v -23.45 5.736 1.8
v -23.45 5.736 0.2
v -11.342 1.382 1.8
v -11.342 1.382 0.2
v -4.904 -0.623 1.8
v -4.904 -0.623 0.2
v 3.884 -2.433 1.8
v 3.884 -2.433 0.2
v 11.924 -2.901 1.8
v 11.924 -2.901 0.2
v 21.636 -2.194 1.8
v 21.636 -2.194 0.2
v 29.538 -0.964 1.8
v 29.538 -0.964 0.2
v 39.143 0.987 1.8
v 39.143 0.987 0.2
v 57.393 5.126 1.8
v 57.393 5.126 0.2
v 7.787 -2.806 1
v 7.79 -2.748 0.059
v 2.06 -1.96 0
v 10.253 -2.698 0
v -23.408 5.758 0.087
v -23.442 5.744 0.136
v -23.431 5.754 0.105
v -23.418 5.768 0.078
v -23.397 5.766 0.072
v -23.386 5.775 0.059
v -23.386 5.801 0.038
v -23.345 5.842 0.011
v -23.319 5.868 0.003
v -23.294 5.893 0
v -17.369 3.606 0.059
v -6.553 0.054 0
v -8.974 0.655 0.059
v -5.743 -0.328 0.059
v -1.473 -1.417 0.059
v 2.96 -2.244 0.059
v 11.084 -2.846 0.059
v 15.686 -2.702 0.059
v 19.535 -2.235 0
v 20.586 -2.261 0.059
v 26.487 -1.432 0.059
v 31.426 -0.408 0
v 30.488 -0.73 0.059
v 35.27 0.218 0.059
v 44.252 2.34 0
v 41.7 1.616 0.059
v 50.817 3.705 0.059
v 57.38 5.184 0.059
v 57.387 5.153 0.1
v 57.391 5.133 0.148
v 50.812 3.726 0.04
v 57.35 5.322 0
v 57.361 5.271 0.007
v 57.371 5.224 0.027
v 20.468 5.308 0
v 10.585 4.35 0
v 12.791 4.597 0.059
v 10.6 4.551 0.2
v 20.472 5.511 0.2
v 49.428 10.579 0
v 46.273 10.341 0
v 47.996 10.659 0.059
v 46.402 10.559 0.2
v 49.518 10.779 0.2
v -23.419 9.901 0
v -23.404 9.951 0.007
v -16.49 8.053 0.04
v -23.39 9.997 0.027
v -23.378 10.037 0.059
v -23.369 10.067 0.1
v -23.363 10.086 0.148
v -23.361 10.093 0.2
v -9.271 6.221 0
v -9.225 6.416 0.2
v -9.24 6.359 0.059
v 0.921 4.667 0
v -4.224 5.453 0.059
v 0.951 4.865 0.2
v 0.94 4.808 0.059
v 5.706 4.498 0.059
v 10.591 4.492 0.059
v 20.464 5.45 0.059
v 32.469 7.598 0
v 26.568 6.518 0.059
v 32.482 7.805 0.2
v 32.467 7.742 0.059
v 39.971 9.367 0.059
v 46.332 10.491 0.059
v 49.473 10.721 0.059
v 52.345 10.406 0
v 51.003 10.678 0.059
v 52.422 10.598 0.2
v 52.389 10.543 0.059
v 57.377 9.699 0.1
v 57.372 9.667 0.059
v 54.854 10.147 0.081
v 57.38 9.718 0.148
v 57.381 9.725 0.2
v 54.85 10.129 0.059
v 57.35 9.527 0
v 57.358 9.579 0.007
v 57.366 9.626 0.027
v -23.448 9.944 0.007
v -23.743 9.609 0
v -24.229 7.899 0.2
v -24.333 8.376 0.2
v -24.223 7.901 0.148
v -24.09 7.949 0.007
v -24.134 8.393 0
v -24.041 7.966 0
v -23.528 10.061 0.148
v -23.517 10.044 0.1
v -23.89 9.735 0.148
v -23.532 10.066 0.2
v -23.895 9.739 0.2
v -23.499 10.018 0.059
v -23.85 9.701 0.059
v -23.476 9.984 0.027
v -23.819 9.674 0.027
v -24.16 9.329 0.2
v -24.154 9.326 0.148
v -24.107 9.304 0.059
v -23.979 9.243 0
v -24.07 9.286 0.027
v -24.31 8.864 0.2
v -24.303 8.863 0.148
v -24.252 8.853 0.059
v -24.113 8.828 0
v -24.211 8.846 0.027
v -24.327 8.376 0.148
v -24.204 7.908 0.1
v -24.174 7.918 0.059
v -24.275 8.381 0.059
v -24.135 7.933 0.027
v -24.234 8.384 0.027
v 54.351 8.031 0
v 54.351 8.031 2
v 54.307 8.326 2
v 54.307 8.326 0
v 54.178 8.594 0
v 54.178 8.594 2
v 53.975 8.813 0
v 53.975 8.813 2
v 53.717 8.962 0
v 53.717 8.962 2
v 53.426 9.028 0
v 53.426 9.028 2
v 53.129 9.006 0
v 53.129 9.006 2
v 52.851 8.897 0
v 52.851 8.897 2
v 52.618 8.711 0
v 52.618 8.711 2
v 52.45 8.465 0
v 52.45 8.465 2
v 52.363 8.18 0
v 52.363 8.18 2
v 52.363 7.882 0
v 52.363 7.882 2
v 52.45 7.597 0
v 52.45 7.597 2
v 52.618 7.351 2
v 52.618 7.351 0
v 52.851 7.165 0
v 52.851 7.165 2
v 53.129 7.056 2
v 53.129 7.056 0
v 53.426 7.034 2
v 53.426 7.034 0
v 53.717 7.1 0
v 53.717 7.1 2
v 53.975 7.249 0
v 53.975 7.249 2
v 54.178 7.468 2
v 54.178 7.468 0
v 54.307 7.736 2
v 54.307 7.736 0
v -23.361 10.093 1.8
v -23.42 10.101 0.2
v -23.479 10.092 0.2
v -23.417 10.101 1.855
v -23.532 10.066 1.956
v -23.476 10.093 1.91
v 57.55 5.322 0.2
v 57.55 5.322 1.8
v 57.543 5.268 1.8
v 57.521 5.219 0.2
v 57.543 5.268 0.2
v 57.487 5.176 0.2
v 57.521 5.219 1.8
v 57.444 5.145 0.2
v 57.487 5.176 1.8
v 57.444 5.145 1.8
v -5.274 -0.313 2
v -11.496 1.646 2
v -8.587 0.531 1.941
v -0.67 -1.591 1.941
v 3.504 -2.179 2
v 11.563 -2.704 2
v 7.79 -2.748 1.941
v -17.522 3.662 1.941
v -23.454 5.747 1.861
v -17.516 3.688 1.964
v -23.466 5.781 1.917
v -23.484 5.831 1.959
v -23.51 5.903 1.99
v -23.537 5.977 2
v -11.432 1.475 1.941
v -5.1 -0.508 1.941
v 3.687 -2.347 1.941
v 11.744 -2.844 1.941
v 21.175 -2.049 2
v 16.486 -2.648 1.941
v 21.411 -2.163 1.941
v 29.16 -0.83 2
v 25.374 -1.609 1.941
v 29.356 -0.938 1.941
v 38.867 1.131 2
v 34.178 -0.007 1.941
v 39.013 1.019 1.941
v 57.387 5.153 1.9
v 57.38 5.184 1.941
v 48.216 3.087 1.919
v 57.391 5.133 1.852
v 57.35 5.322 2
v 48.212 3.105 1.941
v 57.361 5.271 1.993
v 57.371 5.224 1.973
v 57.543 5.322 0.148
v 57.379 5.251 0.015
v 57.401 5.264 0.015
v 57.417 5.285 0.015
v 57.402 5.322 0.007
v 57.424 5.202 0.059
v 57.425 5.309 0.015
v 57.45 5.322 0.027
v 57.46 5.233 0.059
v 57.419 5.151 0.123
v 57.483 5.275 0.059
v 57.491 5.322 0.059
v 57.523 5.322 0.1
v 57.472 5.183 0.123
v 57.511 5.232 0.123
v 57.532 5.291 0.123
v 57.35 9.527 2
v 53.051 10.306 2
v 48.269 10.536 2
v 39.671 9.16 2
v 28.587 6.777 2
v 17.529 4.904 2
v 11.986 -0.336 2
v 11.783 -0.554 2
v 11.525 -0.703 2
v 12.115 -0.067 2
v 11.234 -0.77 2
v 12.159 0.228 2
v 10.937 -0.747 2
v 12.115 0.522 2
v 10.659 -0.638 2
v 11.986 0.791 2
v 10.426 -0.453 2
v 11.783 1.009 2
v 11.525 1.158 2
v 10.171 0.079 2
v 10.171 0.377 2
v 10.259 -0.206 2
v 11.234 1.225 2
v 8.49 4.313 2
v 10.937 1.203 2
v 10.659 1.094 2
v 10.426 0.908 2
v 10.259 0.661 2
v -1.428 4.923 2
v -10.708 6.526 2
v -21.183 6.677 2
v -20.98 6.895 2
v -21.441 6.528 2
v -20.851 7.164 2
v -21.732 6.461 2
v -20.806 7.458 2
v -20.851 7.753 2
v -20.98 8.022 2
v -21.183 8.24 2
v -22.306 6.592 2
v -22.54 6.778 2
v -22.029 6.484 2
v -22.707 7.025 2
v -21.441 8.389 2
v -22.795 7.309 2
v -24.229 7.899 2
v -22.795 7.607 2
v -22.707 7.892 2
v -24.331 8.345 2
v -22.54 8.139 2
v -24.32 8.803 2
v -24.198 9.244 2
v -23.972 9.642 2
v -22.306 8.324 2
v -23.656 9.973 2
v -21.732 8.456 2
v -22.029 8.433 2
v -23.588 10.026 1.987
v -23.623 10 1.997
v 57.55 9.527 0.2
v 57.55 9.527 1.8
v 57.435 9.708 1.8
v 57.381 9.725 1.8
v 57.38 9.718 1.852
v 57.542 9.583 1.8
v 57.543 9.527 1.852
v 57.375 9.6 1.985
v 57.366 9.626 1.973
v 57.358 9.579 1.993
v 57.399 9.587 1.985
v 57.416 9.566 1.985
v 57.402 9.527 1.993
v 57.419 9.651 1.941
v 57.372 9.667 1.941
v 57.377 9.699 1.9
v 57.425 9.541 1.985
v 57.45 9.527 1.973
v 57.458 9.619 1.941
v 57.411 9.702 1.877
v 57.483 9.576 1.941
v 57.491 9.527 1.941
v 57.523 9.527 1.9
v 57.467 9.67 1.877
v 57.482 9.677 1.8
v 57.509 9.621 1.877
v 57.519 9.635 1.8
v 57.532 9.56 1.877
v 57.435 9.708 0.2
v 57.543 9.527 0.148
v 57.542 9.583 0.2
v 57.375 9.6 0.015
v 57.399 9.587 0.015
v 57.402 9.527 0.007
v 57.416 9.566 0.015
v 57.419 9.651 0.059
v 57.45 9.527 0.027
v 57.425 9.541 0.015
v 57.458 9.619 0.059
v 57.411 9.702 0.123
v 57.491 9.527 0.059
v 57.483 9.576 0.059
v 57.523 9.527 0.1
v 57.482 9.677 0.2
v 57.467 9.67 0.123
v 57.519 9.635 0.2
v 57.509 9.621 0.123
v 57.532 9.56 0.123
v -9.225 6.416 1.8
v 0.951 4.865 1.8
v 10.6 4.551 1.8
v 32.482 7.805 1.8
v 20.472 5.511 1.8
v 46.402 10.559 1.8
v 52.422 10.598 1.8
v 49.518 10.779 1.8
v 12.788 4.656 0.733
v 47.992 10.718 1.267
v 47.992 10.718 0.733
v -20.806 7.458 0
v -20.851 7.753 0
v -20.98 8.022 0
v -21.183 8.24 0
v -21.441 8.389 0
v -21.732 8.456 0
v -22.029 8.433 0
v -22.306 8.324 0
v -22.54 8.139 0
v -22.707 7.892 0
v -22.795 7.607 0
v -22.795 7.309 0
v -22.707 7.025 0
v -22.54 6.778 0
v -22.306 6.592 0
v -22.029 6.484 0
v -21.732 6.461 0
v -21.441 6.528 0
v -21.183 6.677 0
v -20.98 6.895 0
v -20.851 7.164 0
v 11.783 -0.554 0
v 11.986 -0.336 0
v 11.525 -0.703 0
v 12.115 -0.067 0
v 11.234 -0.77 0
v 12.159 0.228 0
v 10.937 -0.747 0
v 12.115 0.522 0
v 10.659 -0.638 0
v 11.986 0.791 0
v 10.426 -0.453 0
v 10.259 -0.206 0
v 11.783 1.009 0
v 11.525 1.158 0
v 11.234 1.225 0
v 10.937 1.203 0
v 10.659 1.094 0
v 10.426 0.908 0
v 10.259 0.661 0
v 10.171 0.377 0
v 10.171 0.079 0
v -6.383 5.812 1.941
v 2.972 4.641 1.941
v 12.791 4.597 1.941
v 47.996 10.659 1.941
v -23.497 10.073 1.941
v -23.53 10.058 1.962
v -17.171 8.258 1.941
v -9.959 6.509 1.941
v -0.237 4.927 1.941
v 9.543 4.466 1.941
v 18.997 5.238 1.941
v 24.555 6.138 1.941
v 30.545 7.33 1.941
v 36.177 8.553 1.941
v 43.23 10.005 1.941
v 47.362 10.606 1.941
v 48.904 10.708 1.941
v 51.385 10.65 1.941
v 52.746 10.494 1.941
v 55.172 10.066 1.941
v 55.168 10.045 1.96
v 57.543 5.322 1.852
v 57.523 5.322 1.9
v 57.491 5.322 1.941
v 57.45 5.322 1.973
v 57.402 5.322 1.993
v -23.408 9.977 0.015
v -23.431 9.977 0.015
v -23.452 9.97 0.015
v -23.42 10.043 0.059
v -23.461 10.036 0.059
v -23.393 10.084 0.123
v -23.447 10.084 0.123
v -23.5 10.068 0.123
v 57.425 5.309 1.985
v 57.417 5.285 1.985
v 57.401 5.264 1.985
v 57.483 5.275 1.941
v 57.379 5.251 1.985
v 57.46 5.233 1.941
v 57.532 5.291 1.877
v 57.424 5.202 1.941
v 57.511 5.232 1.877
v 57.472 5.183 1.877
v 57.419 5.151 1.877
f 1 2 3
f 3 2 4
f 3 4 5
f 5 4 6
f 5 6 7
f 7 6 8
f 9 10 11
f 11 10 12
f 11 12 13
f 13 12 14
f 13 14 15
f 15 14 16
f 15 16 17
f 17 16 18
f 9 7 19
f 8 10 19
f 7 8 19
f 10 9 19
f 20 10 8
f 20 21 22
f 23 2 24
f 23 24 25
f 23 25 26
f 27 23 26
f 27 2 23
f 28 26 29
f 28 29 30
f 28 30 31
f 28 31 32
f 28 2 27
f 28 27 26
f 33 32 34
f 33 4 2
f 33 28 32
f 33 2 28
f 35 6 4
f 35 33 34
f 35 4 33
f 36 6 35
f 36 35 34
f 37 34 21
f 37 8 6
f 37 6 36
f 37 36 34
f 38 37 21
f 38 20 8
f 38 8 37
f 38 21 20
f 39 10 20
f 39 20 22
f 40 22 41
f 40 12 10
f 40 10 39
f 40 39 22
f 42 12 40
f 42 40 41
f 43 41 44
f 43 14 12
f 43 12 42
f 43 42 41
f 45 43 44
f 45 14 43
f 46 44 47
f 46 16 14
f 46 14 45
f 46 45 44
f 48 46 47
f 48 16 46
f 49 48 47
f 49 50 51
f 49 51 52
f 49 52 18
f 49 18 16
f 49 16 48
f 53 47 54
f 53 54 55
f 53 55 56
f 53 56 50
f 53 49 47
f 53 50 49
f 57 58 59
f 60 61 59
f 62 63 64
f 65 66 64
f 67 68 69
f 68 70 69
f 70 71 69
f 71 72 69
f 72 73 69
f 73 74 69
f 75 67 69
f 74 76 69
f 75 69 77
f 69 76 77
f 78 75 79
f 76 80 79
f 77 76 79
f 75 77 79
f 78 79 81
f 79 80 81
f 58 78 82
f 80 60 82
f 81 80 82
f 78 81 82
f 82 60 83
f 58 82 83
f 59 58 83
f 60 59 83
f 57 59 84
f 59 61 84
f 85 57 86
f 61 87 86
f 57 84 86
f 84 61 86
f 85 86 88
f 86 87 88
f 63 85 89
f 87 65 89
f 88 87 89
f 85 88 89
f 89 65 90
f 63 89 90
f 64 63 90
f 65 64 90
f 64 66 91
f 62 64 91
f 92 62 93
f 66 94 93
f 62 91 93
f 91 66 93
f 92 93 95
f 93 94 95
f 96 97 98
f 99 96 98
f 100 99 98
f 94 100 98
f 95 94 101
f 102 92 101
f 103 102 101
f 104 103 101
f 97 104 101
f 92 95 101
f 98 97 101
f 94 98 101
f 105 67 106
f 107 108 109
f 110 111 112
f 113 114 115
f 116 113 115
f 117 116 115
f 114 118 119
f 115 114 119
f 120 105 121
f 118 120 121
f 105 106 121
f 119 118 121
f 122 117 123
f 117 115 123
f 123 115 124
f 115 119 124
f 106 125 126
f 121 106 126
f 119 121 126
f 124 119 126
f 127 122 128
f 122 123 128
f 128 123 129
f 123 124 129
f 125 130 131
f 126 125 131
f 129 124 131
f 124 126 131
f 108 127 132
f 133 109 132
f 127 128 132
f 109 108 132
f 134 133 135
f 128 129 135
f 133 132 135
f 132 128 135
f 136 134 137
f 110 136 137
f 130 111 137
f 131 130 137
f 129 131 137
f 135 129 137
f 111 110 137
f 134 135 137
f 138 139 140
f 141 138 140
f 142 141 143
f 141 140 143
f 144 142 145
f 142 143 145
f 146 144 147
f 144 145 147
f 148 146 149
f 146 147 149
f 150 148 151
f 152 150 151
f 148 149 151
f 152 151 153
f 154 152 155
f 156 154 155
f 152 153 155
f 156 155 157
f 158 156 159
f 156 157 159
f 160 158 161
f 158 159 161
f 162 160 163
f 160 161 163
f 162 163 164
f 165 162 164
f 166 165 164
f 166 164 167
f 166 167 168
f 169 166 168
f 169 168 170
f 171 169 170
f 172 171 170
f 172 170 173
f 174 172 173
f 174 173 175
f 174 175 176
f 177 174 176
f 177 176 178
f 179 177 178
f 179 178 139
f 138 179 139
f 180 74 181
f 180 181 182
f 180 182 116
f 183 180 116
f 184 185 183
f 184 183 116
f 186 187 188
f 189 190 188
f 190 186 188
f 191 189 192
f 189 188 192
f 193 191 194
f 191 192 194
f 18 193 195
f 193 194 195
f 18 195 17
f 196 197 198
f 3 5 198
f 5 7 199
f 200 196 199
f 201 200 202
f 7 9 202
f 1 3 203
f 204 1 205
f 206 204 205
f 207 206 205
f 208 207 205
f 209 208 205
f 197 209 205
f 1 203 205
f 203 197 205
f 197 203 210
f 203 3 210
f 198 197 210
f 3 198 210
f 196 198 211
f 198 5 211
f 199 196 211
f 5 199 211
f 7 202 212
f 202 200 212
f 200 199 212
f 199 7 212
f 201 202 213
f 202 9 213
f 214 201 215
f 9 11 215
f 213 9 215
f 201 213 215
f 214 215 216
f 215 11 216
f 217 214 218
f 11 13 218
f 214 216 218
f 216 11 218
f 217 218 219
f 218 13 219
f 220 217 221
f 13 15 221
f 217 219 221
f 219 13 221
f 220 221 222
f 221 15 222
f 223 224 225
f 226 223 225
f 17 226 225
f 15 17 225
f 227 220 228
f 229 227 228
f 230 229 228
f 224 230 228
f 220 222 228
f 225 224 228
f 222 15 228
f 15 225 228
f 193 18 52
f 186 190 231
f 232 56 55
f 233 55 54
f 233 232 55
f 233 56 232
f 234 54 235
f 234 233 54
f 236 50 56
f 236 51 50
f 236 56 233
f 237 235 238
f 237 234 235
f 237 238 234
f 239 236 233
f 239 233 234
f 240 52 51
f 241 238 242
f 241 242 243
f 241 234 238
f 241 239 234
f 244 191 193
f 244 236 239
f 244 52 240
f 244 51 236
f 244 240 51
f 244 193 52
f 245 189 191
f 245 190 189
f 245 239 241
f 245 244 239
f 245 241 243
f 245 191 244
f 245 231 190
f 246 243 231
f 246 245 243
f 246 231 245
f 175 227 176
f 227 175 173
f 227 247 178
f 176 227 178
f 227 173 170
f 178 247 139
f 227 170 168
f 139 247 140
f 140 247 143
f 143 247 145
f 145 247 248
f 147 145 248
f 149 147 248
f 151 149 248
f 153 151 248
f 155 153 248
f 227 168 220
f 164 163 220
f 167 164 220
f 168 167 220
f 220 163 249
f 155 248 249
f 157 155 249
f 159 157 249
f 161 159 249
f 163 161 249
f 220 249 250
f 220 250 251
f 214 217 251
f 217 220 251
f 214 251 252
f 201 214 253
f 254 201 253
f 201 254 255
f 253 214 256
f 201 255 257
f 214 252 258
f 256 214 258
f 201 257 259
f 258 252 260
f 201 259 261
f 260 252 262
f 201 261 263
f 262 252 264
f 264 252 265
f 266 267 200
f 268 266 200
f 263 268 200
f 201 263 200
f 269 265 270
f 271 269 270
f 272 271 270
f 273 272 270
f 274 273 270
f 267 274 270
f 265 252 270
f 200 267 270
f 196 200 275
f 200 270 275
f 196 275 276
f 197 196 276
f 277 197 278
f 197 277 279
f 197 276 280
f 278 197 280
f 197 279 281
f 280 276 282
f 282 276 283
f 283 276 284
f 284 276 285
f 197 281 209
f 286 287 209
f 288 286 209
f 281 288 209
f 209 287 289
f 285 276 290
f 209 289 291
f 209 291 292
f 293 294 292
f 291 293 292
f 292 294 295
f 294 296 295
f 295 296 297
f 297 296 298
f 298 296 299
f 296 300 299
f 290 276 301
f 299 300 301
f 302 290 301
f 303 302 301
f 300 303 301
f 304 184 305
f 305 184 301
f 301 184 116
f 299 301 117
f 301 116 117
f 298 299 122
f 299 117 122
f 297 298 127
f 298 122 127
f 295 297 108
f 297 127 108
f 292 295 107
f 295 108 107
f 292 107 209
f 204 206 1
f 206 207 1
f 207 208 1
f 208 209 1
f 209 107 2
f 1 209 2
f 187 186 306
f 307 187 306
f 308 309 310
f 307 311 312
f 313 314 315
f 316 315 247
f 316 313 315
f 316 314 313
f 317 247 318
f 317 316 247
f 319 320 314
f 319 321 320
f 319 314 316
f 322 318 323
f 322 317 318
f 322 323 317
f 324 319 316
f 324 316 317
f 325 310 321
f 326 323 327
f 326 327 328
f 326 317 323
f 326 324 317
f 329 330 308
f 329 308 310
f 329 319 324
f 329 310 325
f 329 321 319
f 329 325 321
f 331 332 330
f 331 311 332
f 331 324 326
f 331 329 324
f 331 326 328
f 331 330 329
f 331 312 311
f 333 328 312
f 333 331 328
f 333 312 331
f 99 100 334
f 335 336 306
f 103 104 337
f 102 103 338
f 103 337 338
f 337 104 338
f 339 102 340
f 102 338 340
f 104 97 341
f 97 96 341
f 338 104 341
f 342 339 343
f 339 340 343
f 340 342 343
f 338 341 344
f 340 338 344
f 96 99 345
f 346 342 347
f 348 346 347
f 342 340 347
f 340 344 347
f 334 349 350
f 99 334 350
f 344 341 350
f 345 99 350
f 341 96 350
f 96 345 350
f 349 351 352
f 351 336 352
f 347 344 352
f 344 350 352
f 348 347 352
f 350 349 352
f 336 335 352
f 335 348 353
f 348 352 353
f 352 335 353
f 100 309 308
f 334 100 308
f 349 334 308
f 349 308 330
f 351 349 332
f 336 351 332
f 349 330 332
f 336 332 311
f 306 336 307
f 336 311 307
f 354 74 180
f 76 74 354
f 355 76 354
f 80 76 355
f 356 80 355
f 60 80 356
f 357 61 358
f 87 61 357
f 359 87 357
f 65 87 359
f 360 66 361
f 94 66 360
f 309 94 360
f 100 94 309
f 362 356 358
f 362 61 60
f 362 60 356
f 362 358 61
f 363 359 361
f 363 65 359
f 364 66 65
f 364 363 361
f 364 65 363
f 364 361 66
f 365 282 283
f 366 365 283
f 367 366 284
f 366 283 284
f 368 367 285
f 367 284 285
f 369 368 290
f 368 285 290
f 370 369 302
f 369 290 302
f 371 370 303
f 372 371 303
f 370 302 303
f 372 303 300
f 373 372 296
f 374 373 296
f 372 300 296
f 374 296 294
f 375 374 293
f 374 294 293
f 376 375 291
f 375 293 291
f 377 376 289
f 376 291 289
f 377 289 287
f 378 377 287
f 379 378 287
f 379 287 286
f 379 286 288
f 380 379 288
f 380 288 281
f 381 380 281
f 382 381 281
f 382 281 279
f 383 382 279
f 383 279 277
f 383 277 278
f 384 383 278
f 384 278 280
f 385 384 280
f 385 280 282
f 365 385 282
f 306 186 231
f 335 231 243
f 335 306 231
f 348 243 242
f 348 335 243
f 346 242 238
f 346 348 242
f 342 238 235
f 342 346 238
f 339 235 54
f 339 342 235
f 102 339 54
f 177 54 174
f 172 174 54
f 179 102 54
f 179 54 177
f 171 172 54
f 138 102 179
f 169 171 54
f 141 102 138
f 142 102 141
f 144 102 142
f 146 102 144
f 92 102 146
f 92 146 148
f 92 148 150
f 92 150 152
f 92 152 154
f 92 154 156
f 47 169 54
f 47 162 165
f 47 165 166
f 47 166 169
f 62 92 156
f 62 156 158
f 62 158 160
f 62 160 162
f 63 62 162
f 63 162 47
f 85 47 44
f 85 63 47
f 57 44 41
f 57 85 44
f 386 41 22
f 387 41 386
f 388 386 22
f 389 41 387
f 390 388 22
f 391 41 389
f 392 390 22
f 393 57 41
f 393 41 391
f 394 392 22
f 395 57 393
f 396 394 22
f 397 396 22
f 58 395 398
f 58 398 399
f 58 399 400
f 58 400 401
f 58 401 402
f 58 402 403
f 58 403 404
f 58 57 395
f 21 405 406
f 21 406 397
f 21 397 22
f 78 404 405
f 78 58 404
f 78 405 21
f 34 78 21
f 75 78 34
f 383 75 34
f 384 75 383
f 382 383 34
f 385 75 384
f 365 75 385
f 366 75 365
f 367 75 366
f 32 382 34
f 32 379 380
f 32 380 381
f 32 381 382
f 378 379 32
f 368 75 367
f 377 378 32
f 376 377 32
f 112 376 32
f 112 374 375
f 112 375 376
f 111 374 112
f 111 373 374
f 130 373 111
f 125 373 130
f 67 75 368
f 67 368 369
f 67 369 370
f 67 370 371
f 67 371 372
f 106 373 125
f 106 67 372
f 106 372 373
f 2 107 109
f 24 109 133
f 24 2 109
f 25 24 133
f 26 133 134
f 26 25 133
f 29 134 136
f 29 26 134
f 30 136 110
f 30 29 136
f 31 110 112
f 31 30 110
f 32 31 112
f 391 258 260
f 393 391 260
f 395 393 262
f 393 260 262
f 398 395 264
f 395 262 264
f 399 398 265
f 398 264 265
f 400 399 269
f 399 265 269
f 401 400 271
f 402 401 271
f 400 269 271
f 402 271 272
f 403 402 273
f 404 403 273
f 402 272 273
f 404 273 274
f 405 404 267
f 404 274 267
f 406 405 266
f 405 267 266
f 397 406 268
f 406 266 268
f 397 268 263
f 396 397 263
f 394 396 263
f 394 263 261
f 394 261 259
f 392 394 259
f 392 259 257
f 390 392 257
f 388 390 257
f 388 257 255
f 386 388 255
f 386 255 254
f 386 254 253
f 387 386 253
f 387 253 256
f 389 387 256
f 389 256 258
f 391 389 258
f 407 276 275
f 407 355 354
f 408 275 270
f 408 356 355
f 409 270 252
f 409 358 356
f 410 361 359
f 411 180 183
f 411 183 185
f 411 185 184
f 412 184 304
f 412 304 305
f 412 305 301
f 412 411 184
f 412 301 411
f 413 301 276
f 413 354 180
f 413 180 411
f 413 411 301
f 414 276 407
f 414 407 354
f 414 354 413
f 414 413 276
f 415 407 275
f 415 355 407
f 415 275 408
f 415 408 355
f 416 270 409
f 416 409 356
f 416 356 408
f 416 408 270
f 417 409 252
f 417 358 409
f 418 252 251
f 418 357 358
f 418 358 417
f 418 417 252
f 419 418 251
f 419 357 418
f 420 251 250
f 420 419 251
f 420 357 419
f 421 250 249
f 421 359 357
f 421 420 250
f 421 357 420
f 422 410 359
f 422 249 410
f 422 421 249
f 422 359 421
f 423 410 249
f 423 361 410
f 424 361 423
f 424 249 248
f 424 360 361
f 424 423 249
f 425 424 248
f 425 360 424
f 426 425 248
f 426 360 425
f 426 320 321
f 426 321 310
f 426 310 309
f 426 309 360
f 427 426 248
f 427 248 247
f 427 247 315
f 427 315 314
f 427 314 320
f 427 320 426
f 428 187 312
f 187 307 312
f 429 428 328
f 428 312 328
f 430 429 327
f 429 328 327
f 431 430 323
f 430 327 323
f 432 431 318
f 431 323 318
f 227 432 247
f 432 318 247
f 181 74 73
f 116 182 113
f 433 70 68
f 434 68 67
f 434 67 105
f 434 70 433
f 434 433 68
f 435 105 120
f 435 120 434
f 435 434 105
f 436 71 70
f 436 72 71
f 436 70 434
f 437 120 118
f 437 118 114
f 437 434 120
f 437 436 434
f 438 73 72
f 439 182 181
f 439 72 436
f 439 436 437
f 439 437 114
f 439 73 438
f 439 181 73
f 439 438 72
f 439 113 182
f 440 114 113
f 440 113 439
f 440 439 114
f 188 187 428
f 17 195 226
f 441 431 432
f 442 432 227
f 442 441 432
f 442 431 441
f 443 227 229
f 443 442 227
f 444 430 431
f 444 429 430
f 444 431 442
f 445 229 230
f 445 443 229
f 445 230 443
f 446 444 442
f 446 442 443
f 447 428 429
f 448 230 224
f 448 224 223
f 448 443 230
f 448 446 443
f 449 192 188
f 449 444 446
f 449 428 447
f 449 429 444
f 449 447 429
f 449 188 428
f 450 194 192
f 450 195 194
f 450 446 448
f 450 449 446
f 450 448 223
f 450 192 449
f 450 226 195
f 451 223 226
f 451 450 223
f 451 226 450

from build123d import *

# Parameters (mm, degrees)
F1_DEPTH = 2
F2_R     = 0.2
F3_R     = 1
F4_DEPTH = 25


with BuildPart() as f1:
    # F0 (on Top) → F1 (new body)
    with BuildSketch(Plane.XY):
        with BuildLine():
            add(Edge.make_bspline(
                [(-23.4499994786, 10.1196156968), (-12.6840422085, 6.8794836235), (11.4659695917, 0.7743012779), (47.6376526818, 12.5703054123), (54.293501113, 10.2015469925), (57.5500005214, 9.6985708068)],
                knots=[0, 0, 0, 0, 0.4000877965, 0.7950947671, 1, 1, 1, 1], degree=3))
            ThreePointArc((-23.4499994786, 10.1196156968), (-24.2346111204, 9.1477134118), (-24.2294017226, 7.8986408189))
            Line((-24.2294017226, 7.8986408189), (-23.4499994786, 5.7355819738))
            add(Edge.make_bspline(
                [(-23.4499994786, 5.7355819738), (-13.6171771119, 2.3390075956), (8.227052883, -7.6692778938), (39.9984931729, 1.3187098271), (57.5500005214, 5.160813538)],
                knots=[0, 0, 0, 0, 0.4449402587, 1, 1, 1, 1], degree=3))
            Line((57.5500005214, 5.160813538), (57.5500005214, 9.6985708068))
        make_face()
    extrude(amount=F1_DEPTH)

    # F2
    f2_edges = [f1.edges().sort_by_distance(p)[0] for p in [
        (16.801249, -2.683938, 0),
        (-23.839701, 6.817111, 0),
        (-24.234611, 9.147713, 0),
        (-23.449999, 10.119616, 1),
        (17.043425, 5.047028, 0),
        (17.043425, 5.047028, 2),
        (57.550001, 7.429692, 0),
        (57.550001, 7.429692, 2),
        (16.801249, -2.683938, 2),
        (57.550001, 5.160814, 1),
        (57.550001, 9.698571, 1),
    ]]
    fillet(f2_edges, radius=F2_R)

    # F3 (on face) → F4 (cut)
    with BuildSketch(Plane.XY.offset(2)):
        with Locations((-21.8064635992, 7.4584367685)):
            Circle(F3_R)
        with Locations((53.351432085, 8.0309696496)):
            Circle(F3_R)
        with Locations((11.1594959978, 0.2275792018)):
            Circle(F3_R)
    extrude(amount=-F4_DEPTH, mode=Mode.SUBTRACT)


solid = f1.part
